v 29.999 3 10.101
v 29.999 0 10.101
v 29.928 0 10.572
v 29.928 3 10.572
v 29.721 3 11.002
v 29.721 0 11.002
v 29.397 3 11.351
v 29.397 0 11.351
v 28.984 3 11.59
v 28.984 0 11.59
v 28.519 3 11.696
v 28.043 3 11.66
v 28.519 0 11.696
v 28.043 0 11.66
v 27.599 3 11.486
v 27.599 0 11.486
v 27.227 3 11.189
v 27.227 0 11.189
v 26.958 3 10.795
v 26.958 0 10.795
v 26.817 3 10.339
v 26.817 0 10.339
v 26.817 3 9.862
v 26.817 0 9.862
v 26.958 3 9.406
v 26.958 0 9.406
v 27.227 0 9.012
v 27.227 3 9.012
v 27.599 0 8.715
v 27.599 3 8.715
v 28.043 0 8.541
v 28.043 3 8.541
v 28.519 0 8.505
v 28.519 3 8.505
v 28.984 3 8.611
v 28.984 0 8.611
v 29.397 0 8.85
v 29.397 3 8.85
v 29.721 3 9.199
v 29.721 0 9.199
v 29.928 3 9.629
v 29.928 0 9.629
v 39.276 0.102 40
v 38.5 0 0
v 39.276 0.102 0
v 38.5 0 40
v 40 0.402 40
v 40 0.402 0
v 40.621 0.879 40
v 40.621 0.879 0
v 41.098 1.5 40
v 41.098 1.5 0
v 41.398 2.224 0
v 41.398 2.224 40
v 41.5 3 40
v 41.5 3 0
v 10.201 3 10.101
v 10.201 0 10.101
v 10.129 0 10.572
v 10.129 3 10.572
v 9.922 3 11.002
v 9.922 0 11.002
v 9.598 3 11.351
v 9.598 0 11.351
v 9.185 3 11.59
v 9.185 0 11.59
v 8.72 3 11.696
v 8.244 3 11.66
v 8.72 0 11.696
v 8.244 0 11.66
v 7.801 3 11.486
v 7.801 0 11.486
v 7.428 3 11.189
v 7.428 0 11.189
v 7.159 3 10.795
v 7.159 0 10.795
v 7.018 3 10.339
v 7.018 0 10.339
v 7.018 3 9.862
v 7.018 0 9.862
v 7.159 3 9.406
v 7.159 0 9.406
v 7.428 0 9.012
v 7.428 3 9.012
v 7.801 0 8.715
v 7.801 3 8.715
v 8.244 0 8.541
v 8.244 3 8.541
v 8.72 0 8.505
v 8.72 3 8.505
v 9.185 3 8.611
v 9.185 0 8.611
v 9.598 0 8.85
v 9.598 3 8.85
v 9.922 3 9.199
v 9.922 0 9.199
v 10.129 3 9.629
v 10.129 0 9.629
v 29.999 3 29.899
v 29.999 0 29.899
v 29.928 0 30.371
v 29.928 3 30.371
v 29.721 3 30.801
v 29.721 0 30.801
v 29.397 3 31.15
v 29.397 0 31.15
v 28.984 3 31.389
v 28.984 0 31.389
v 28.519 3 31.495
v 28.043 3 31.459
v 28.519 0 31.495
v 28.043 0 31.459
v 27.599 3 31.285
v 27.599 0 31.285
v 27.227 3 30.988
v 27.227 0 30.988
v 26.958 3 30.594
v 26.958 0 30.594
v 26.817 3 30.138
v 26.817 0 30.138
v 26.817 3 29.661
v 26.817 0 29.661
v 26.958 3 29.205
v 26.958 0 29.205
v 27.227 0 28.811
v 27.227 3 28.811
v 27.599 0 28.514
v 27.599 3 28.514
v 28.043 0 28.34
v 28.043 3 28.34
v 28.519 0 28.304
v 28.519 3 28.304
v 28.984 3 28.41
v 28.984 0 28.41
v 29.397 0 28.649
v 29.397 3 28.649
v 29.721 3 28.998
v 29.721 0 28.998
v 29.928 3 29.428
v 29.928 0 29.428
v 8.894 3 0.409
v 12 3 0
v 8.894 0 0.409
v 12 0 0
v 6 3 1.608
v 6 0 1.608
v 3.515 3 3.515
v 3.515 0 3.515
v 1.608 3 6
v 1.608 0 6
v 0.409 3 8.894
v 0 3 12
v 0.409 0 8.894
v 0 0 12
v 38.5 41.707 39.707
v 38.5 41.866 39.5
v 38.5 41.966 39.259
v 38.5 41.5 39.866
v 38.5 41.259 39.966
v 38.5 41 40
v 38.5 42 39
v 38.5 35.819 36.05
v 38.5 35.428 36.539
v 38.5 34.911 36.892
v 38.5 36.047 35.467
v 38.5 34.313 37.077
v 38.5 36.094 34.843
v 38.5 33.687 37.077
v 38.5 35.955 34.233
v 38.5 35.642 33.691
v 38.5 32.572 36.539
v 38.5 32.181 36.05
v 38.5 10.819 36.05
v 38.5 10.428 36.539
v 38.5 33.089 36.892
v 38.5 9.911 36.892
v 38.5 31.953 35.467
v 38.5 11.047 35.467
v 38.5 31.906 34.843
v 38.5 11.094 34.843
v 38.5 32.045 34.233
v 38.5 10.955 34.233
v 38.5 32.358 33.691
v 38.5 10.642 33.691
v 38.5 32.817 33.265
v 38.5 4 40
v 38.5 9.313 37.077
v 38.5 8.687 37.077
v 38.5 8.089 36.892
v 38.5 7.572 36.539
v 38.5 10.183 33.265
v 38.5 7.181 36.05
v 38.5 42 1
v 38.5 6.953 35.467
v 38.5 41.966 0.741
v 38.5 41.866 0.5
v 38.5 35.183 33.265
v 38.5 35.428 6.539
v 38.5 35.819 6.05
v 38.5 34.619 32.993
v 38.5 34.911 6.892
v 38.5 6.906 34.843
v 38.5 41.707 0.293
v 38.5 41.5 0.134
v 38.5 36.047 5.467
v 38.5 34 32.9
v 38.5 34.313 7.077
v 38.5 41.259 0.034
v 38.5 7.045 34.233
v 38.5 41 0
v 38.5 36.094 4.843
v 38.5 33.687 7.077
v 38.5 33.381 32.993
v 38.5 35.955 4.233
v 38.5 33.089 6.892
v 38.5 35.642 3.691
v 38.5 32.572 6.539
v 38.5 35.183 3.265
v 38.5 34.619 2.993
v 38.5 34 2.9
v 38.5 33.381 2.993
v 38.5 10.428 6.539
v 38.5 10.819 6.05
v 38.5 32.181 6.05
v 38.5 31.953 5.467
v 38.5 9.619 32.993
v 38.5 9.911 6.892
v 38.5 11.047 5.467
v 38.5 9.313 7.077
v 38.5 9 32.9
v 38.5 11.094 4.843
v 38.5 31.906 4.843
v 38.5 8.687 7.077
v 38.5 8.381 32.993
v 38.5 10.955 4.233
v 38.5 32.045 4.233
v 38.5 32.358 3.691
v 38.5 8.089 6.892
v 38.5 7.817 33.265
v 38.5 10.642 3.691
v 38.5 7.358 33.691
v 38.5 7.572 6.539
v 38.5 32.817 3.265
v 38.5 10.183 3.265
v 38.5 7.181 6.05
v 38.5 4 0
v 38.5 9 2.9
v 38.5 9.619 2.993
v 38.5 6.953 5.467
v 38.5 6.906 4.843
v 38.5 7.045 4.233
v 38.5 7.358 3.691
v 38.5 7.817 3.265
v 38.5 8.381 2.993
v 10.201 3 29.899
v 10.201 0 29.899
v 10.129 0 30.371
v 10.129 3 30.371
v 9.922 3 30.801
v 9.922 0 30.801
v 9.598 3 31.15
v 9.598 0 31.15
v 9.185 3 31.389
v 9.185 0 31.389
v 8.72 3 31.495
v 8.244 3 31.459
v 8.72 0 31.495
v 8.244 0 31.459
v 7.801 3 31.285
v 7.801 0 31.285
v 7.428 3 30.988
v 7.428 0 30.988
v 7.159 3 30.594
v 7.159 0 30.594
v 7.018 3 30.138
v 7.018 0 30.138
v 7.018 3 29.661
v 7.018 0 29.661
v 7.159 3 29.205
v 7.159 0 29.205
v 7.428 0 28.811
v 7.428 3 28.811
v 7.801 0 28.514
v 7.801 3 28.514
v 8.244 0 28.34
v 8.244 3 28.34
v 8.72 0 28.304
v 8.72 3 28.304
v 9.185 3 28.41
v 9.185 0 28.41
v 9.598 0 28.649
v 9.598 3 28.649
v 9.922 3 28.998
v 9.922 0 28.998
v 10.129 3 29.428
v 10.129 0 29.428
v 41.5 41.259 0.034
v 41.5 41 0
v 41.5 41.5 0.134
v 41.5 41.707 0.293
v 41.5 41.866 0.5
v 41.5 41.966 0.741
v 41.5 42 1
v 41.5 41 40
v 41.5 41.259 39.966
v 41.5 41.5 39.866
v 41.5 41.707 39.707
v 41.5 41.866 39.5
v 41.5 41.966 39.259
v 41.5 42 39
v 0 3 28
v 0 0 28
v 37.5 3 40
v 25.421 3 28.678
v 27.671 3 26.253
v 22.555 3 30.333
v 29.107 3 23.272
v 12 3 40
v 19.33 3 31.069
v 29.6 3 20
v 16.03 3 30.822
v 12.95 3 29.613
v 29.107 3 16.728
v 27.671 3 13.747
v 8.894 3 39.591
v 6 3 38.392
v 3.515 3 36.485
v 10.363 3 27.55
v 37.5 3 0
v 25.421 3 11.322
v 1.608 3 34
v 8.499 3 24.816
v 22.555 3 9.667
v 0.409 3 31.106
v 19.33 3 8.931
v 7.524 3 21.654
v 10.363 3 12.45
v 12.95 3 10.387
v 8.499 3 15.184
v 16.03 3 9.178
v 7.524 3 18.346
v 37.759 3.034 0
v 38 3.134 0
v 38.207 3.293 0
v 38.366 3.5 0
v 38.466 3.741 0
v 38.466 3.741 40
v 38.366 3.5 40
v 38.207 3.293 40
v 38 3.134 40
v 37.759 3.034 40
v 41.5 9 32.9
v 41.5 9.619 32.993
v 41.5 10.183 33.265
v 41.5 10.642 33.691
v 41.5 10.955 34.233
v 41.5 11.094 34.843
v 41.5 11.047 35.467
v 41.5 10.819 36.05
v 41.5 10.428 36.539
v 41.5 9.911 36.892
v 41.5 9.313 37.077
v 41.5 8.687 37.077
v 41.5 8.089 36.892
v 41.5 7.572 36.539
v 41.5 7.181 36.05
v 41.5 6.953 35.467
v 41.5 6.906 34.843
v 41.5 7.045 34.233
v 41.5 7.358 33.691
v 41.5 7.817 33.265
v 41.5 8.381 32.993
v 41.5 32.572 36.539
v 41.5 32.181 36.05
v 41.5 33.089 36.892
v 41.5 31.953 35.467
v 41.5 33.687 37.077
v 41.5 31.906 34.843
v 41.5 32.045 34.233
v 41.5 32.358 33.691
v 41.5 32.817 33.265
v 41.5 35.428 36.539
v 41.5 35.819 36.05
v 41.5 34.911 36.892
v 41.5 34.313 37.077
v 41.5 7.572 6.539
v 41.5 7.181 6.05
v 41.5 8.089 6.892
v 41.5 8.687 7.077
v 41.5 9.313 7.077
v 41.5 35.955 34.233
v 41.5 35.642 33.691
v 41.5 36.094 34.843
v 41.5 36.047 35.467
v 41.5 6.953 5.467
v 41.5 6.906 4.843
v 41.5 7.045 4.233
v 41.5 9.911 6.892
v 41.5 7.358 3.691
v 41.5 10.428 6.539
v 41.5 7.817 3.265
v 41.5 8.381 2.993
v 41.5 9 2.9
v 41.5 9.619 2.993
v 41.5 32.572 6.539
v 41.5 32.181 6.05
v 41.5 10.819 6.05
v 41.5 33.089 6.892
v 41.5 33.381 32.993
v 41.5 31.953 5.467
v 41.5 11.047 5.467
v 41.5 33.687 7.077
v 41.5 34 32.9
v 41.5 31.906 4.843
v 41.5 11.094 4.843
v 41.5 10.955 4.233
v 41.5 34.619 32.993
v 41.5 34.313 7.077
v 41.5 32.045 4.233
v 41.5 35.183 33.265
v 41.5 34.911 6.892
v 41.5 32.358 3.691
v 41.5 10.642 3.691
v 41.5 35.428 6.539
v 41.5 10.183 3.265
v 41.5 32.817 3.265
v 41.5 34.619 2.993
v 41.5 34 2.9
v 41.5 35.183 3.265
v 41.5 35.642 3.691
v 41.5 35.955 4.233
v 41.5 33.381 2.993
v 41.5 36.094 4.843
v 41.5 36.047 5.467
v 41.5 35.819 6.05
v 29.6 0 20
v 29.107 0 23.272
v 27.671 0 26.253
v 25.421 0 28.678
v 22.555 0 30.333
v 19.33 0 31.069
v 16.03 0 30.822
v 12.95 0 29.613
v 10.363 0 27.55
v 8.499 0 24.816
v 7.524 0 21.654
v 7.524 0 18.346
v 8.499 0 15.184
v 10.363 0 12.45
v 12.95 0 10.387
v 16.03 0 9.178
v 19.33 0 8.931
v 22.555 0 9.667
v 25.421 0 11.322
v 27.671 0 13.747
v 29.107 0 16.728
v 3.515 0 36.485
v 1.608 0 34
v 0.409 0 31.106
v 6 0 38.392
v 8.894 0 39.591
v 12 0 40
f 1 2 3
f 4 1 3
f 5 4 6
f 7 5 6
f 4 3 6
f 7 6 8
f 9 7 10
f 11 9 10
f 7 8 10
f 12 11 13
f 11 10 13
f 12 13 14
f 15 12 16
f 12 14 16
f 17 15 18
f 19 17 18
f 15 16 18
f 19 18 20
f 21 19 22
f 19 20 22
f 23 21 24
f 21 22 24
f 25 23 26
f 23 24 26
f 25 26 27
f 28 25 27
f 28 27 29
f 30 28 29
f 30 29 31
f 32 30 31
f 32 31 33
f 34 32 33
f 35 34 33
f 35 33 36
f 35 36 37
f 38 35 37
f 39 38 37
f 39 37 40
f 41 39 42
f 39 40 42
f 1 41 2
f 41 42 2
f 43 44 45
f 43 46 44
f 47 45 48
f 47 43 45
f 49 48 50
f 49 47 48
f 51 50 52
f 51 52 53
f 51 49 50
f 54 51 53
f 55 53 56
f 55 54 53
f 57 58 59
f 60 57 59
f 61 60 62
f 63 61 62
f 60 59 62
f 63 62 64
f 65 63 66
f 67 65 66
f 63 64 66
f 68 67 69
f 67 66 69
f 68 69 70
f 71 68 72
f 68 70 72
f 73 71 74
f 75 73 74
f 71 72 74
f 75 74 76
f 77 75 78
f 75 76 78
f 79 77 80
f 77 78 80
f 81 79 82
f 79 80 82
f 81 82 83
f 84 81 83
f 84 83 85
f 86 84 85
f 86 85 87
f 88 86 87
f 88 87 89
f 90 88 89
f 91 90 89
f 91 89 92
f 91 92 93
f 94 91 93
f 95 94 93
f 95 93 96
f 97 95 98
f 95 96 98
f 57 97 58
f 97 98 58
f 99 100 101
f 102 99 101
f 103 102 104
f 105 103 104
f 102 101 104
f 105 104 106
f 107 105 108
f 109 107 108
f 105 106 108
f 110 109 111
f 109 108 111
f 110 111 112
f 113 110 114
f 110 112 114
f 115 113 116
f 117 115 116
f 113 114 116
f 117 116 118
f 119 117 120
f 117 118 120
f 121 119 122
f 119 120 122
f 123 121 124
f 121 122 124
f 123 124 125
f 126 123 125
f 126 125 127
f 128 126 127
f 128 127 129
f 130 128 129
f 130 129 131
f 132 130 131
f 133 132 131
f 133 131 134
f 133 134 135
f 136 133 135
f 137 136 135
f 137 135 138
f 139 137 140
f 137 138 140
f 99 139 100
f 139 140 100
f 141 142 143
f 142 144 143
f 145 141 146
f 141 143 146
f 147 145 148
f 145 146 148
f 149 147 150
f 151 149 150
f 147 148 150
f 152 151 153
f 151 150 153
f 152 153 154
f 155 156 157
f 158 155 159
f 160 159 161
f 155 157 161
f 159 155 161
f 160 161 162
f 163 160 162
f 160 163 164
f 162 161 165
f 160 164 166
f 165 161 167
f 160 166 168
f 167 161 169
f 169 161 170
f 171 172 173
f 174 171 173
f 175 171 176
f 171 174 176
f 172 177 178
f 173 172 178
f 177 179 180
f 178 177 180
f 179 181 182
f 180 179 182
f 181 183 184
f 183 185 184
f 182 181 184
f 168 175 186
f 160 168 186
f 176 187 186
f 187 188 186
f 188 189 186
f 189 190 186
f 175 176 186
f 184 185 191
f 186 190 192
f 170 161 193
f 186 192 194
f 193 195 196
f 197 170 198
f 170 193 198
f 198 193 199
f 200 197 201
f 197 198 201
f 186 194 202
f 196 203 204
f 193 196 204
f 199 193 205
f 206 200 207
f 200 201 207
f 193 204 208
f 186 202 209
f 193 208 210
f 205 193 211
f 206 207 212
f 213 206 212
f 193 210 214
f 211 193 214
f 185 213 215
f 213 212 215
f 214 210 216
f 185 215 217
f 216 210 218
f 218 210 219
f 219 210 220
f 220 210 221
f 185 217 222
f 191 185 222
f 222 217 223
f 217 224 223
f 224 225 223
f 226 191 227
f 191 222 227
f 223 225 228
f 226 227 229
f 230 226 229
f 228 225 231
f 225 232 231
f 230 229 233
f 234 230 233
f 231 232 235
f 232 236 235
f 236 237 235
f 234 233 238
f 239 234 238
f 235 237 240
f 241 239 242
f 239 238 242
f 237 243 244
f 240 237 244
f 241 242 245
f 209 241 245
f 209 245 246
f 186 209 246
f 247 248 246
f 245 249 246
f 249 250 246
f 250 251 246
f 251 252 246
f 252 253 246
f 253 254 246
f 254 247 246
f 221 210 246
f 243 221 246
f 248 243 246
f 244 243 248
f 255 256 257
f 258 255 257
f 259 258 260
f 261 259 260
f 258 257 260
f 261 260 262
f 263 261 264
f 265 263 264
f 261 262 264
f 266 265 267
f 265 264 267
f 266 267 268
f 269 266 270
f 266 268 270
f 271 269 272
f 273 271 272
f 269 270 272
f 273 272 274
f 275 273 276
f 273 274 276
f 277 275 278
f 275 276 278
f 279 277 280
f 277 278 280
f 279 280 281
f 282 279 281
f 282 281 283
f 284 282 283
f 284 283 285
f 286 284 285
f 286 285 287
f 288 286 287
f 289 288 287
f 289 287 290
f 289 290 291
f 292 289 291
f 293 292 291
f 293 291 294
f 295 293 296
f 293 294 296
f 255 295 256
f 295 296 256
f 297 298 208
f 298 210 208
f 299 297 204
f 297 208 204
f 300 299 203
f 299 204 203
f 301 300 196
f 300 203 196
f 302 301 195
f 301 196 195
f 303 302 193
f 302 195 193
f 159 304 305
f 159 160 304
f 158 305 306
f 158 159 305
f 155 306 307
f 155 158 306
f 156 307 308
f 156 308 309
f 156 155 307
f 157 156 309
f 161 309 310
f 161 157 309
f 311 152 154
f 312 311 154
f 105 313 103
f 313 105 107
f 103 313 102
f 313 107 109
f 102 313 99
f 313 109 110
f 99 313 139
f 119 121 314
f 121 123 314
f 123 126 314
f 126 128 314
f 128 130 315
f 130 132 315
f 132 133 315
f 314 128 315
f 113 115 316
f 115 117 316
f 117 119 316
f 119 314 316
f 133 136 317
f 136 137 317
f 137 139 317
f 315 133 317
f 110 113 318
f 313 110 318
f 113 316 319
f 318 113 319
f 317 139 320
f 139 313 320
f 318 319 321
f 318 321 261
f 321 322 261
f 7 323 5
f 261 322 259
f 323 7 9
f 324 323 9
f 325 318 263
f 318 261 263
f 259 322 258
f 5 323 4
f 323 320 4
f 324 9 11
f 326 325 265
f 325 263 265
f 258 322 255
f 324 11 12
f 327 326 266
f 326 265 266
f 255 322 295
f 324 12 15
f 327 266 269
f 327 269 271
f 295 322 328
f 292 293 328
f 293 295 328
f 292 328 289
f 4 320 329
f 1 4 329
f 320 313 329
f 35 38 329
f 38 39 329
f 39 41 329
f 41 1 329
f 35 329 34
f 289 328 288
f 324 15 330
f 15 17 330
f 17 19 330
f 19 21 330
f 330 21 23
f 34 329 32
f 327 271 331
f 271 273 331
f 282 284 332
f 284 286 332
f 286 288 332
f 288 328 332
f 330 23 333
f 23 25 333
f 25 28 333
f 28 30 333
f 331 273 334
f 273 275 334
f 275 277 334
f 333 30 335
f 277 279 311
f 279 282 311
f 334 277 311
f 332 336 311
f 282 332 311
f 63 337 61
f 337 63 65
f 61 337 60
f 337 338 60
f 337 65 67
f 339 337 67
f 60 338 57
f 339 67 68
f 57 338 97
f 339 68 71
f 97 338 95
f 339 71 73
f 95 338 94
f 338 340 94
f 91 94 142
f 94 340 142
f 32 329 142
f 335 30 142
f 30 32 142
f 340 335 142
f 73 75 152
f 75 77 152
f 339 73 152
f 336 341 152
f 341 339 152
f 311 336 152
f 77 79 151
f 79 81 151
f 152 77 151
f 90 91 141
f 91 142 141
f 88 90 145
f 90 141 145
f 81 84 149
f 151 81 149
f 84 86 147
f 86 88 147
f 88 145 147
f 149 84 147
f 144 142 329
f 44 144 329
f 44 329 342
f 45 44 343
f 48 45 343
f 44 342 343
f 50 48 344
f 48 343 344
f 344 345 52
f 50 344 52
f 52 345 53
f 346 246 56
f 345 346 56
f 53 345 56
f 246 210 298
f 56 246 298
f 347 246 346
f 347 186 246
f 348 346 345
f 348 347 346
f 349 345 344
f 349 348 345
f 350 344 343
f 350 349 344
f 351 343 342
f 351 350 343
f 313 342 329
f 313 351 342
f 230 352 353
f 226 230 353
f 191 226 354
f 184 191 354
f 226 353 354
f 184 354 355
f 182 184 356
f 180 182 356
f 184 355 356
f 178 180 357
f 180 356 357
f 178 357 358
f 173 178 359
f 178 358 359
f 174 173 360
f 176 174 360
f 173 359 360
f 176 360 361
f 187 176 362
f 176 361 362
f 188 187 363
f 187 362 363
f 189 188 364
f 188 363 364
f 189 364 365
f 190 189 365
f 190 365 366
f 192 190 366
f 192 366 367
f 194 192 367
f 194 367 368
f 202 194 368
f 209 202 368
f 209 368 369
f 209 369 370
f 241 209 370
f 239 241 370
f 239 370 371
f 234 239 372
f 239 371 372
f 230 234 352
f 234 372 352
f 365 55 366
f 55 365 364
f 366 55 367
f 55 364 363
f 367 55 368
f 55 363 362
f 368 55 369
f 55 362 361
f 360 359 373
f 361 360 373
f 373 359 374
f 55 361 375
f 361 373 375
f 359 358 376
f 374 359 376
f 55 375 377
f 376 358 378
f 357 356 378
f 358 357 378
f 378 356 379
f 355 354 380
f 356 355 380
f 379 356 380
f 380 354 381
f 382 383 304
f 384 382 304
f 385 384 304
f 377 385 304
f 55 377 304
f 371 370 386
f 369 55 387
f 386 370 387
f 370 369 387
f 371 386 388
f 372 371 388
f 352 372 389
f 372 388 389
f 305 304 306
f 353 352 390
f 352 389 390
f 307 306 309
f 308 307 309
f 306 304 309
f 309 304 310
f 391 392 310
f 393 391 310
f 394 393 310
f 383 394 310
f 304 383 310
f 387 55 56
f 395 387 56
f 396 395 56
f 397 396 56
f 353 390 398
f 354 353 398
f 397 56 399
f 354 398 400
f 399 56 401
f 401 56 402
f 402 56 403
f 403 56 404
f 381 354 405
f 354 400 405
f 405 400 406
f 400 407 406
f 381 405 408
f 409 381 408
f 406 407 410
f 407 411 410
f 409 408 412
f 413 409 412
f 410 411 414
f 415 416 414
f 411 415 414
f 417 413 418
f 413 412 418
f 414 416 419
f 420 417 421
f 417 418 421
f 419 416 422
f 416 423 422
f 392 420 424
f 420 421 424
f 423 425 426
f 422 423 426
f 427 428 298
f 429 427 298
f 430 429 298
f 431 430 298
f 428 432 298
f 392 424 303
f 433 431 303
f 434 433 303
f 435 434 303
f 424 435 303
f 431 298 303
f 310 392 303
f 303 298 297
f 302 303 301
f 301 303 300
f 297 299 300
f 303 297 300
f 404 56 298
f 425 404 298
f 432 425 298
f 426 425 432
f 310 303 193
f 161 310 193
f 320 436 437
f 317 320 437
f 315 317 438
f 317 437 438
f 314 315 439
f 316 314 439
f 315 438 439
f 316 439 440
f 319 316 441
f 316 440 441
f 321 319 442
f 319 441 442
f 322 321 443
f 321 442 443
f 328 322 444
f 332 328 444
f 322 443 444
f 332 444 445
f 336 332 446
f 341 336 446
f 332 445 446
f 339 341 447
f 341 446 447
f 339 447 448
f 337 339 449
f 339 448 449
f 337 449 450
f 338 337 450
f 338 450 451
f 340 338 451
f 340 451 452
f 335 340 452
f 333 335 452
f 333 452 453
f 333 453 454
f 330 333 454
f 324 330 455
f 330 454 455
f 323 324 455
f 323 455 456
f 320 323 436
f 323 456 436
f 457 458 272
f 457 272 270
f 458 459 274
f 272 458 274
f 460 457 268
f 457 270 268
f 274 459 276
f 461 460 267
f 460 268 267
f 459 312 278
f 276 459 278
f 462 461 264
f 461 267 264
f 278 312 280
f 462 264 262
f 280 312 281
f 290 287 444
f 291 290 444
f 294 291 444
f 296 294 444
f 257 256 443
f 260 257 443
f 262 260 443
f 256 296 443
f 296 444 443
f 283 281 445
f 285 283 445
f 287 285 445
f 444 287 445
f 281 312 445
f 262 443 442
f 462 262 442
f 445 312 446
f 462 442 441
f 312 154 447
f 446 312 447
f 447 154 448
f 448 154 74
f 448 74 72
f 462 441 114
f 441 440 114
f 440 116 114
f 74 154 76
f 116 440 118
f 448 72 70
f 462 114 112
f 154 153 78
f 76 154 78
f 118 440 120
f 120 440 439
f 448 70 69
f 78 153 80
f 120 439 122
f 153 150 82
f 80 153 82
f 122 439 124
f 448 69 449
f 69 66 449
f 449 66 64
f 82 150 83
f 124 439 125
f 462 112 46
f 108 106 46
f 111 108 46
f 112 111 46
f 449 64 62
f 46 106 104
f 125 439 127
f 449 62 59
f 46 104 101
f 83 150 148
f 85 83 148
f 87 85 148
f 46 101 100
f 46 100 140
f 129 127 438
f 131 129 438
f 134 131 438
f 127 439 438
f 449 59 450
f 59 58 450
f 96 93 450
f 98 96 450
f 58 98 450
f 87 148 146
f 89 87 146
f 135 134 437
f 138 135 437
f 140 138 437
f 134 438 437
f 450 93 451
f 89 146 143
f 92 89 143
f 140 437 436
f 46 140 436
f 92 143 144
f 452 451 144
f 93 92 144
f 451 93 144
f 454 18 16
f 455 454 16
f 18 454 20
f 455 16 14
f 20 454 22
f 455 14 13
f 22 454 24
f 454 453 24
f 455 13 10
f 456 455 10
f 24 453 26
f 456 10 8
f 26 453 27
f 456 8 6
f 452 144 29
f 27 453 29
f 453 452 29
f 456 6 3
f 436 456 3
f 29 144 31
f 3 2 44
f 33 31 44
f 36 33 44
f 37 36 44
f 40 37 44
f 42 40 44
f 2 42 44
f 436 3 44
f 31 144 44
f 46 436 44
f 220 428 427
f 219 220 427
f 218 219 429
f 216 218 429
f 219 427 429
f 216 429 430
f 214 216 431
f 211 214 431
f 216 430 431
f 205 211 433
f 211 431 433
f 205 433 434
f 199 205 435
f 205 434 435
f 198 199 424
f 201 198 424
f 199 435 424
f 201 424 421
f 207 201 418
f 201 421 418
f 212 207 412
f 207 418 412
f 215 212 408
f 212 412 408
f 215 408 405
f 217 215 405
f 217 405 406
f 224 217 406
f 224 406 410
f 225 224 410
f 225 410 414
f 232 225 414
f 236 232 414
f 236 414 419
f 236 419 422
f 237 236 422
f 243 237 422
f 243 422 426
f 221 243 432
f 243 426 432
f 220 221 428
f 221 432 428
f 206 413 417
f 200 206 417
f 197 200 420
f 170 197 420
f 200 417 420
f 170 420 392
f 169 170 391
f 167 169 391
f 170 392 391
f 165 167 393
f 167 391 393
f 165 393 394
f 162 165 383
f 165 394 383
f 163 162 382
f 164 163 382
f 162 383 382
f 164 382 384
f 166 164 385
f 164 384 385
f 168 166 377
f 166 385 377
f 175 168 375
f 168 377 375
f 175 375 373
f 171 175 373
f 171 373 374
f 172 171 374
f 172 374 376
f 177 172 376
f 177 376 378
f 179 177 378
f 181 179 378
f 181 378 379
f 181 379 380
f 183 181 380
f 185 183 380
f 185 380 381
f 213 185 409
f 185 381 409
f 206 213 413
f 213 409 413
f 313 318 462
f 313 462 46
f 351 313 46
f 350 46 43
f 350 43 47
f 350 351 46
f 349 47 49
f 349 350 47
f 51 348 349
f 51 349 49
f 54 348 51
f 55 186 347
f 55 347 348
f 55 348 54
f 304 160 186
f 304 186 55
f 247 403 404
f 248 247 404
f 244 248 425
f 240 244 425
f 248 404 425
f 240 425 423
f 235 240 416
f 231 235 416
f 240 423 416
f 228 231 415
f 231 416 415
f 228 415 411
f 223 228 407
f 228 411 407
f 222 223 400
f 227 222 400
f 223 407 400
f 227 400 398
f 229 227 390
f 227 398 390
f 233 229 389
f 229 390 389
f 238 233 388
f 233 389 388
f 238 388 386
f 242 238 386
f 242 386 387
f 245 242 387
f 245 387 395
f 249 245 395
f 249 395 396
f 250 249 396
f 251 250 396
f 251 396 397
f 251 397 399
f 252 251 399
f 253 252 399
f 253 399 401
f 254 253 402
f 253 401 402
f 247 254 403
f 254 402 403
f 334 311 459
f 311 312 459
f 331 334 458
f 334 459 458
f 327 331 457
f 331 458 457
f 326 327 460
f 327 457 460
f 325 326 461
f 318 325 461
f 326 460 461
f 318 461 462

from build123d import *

# Parameters (mm, degrees)
EXTRUDE_1_DEPTH     = 40
SKETCH_2_R          = 2.1
CUT_EXTRUDE_1_DEPTH = 3
SKETCH_3_R          = 11.1
SKETCH_3_R_2        = 1.6
CUT_EXTRUDE_2_DEPTH = 3
FILLET_1_R          = 3
FILLET_2_R          = 12
FILLET_3_R          = 1
FILLET_4_R          = 1


with BuildPart() as part:
    # 草图1 → 凸台-拉伸1 (new body)
    with BuildSketch(Plane.XY):
        Polygon((0, 3), (0, 0), (38.5, 0), (41.5, 0), (41.5, 3), (41.5, 42), (38.5, 42), (38.5, 3), align=None)
    extrude(amount=EXTRUDE_1_DEPTH)

    # 草图2 → 切除-拉伸1 (cut)
    with BuildSketch(Plane(origin=(41.5, 0, 0), x_dir=(0, 0, -1), z_dir=(1, 0, 0))):
        with Locations((-35, 34)):
            Circle(SKETCH_2_R)
        with Locations((-5, 34)):
            Circle(SKETCH_2_R)
        with Locations((-35, 9)):
            Circle(SKETCH_2_R)
        with Locations((-5, 9)):
            Circle(SKETCH_2_R)
    extrude(amount=-CUT_EXTRUDE_1_DEPTH, mode=Mode.SUBTRACT)

    # 草图3 → 切除-拉伸2 (cut)
    with BuildSketch(Plane.XZ):
        with Locations((18.5, 20)):
            Circle(SKETCH_3_R)
        with Locations((8.600505063, 29.899494937)):
            Circle(SKETCH_3_R_2)
        with Locations((28.399494937, 29.899494937)):
            Circle(SKETCH_3_R_2)
        with Locations((28.399494937, 10.100505063)):
            Circle(SKETCH_3_R_2)
        with Locations((8.600505063, 10.100505063)):
            Circle(SKETCH_3_R_2)
    extrude(amount=-CUT_EXTRUDE_2_DEPTH, mode=Mode.SUBTRACT)

    # 圆角1
    fillet_1_edges = [part.edges().sort_by_distance(p)[0] for p in [
        (41.5, 0, 20),
    ]]
    fillet(fillet_1_edges, radius=FILLET_1_R)

    # 圆角2
    fillet_2_edges = [part.edges().sort_by_distance(p)[0] for p in [
        (0, 1.5, 40),
        (0, 1.5, 0),
    ]]
    fillet(fillet_2_edges, radius=FILLET_2_R)

    # 圆角3
    fillet_3_edges = [part.edges().sort_by_distance(p)[0] for p in [
        (40, 42, 40),
        (40, 42, 0),
    ]]
    fillet(fillet_3_edges, radius=FILLET_3_R)

    # 圆角4
    fillet_4_edges = [part.edges().sort_by_distance(p)[0] for p in [
        (38.5, 3, 20),
    ]]
    fillet(fillet_4_edges, radius=FILLET_4_R)


solid = part.part
